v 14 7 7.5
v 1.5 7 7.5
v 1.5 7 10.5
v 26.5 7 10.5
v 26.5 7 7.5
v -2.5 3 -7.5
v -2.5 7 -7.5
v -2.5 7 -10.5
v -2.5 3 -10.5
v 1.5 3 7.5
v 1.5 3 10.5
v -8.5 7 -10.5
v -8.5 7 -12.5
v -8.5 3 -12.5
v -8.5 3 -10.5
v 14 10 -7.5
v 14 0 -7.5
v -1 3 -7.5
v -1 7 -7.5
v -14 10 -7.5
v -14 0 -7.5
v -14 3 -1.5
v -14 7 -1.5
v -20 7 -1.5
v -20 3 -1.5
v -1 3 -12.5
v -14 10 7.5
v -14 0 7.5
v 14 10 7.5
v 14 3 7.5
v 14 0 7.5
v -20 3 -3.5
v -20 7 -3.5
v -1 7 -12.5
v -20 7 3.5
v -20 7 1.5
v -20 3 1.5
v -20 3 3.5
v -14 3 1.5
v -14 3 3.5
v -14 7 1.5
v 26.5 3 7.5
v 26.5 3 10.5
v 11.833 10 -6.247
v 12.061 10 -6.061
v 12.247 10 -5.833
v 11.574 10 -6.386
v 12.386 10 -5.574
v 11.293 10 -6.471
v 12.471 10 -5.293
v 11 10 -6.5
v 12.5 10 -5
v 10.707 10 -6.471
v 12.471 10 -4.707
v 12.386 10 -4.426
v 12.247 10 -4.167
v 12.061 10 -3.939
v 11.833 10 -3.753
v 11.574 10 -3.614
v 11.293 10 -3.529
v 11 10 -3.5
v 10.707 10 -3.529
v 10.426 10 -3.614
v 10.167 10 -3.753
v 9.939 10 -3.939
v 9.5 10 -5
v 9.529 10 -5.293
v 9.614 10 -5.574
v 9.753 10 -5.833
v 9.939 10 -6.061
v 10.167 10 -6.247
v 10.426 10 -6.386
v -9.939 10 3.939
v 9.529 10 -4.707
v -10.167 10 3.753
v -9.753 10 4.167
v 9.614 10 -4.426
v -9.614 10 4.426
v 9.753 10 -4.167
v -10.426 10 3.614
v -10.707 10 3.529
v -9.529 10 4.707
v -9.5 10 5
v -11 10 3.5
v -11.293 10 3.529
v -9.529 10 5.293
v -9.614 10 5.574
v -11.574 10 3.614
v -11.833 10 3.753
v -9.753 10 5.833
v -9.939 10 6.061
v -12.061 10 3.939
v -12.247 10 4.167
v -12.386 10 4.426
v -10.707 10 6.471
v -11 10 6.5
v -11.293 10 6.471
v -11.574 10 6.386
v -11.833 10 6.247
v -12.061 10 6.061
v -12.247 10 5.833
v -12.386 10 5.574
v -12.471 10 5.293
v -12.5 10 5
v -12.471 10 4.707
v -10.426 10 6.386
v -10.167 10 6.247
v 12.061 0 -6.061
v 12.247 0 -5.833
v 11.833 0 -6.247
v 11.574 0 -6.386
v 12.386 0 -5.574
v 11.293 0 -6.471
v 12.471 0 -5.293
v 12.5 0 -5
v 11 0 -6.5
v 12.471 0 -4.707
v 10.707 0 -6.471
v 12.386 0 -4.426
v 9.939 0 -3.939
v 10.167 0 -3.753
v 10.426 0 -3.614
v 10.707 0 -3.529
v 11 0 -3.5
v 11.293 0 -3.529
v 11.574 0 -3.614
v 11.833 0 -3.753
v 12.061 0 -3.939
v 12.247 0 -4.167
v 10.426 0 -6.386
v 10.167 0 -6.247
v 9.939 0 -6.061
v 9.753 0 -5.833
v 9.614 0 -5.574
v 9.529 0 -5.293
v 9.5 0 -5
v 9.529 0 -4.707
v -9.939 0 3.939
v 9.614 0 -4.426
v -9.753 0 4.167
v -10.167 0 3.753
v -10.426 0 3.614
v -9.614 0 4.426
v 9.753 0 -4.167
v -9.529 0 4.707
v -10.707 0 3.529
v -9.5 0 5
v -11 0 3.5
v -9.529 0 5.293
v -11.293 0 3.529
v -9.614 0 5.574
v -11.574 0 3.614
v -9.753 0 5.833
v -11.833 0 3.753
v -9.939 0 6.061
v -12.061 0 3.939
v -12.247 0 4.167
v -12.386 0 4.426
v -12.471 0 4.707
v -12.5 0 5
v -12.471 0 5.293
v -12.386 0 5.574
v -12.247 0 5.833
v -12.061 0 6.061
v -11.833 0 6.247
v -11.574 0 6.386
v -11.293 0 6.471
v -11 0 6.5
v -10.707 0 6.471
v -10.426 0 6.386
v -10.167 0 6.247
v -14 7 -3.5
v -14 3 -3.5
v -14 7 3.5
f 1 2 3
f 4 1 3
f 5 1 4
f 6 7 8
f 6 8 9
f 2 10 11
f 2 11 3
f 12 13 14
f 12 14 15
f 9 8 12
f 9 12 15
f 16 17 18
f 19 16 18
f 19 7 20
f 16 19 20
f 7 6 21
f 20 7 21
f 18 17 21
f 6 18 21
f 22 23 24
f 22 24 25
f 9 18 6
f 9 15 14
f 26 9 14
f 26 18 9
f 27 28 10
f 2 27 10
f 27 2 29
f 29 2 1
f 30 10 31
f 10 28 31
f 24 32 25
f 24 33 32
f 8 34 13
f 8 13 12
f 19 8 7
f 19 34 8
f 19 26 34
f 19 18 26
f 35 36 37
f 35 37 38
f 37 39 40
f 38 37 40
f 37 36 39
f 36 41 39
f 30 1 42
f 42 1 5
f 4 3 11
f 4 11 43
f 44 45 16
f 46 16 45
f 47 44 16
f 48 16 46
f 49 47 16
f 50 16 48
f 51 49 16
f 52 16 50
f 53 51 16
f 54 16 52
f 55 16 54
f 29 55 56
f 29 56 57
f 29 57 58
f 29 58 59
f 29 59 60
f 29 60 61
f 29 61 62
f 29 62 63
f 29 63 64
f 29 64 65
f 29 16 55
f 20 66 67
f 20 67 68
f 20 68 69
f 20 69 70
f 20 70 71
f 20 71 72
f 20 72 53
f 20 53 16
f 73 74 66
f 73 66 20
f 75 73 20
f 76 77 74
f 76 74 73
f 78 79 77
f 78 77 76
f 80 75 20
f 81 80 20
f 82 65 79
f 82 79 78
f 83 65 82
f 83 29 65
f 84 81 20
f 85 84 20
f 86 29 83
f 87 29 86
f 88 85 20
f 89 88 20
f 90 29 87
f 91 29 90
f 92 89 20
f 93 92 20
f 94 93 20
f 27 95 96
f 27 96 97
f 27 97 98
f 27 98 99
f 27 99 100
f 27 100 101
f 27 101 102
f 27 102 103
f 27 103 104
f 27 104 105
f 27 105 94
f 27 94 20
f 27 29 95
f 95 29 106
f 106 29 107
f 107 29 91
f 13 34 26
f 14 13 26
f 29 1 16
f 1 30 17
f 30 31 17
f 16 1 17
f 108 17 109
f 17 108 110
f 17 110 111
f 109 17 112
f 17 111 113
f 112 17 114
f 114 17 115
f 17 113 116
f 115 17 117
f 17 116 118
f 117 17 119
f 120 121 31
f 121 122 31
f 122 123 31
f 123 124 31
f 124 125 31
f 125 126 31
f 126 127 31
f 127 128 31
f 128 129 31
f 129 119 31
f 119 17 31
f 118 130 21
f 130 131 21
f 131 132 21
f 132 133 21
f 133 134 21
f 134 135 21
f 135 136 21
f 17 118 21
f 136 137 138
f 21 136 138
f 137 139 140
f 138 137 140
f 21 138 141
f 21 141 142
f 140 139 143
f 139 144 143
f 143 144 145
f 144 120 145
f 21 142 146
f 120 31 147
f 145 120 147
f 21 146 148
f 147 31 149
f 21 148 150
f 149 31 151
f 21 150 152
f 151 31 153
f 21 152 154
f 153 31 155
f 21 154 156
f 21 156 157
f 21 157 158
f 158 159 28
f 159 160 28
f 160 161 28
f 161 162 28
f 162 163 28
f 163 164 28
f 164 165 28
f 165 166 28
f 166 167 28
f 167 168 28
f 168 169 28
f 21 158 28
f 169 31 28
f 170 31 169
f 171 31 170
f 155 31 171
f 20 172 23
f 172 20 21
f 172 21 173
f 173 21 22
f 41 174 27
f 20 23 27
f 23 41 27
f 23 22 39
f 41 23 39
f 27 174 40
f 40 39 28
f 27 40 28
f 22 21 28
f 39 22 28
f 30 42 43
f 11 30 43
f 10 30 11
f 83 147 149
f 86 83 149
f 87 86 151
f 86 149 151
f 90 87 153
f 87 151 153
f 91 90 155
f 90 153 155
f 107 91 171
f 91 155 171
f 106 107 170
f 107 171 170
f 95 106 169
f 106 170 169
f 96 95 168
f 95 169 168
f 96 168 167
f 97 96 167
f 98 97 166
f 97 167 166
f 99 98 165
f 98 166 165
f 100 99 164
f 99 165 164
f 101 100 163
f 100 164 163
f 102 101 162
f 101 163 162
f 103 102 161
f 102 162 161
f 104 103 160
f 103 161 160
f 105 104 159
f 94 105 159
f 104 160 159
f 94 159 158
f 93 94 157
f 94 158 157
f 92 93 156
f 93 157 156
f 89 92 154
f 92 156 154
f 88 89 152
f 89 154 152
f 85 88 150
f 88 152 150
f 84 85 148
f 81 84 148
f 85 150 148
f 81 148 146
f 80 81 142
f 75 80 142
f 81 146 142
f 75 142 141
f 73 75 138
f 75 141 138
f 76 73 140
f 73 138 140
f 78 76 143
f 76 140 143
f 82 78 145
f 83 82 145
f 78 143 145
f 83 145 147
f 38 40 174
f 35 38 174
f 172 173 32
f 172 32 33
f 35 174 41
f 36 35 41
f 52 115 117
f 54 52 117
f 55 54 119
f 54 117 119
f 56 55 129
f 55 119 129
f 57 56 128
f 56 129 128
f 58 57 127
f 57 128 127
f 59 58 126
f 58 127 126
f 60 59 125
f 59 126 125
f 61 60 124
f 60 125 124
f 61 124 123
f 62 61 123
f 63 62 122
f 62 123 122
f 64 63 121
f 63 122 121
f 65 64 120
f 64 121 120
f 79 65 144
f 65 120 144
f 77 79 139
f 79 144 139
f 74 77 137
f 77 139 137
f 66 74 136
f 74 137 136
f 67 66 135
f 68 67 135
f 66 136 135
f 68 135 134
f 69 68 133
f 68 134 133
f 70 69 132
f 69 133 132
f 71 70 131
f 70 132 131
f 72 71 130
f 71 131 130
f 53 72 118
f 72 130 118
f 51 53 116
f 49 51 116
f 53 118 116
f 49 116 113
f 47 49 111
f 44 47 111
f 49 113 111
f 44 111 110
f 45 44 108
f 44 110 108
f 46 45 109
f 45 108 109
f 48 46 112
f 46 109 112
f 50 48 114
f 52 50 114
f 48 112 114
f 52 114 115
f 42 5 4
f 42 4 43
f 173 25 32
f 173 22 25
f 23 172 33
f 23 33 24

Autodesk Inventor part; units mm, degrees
ref_plane "YZ Plane" through (0, 0, 0) normal (1, 0, 0) x (0, 1, 0)
ref_plane "XZ Plane" through (0, 0, 0) normal (0, 1, 0) x (-1, 0, 0)
ref_plane "XY Plane" through (0, 0, 0) normal (0, 0, 1) x (1, 0, 0)
sketch "Sketch1" plane through (0, 0, 0) normal (0, 1, 0) x (-1, 0, 0)
  line L0 (14, 7.5) -> (-14, 7.5)
  line L1 (-14, 7.5) -> (-14, -7.5)
  line L2 (-14, -7.5) -> (14, -7.5)
  line L3 (14, -7.5) -> (14, 7.5)
  line L4 (14, 7.5) -> (-14, -7.5) construction
  line L5 (-14, 7.5) -> (14, -7.5) construction
  point P0 (0, 0)
  dimension "d0" = 28
  dimension "d1" = 15
extrude "Extrusion1" add sketch "Sketch1" along normal blind 10
sketch "Sketch2" plane through (-14, 0, 7.5) normal (0, 0, 1) x (1, 0, 0)
  line L0 (15.5, 7) -> (40.5, 7)
  line L1 (40.5, 7) -> (40.5, 3)
  line L2 (40.5, 3) -> (15.5, 3)
  line L3 (15.5, 3) -> (15.5, 7)
  line L4 (28, 0) -> (28, 10) projected
  line L5 (15.5, 7) -> (40.5, 3) construction
  line L6 (40.5, 7) -> (15.5, 3) construction
  point P0 (14, 0)
  point P1 (28, 5)
  dimension "d4" = 25
  dimension "d5" = 4
extrude "Extrusion2" add sketch "Sketch2" along normal blind 3
sketch "Sketch3" plane through (14, 0, -7.5) normal (0, 0, -1) x (-1, 0, 0)
  line L0 (0, 3) -> (0, 7) projected
  line L1 (0, 5) -> (15, 5)
  line L2 (16.5, 3) -> (13.5, 3)
  line L3 (13.5, 3) -> (13.5, 7)
  line L4 (13.5, 7) -> (16.5, 7)
  line L5 (16.5, 7) -> (16.5, 3)
  line L6 (16.5, 3) -> (13.5, 7) construction
  line L7 (13.5, 3) -> (16.5, 7) construction
  line L8 (15, 3) -> (15, 7)
  point P0 (14, 0)
  dimension "d8" = 15
  dimension "d9" = 3
extrude "Extrusion3" add sketch "Sketch3" along normal blind 5 contours L8 L4 L5 L2
sketch "Sketch4" plane through (-2.5, 3, -7.5) normal (-1, 0, 0) x (0, 0, 1)
  line L0 (-5, 4) -> (-5, 0) projected
  line L1 (-5, 4) -> (-3, 4)
  line L2 (-3, 4) -> (-3, 0)
  line L3 (-3, 0) -> (-5, 0)
  line L4 (-5, 0) -> (-5, 4)
  point P0 (7.5, -3)
  dimension "d12" = 2
extrude "Extrusion4" add sketch "Sketch4" along normal blind 6
sketch "Sketch5" plane through (-14, 0, -7.5) normal (-1, 0, 0) x (0, 0, 1)
  line L0 (0, 0) -> (0, 10) projected
  line L1 (0, 5) -> (4, 5)
  line L2 (6, 3) -> (2, 3)
  line L3 (2, 3) -> (2, 7)
  line L4 (2, 7) -> (6, 7)
  line L5 (6, 7) -> (6, 3)
  line L6 (6, 3) -> (2, 7) construction
  line L7 (2, 3) -> (6, 7) construction
  line L8 (4, 3) -> (4, 7)
  line L9 (7.5, 0) -> (7.5, 3)
  line L10 (15, 5) -> (11, 5)
  line L11 (9, 3) -> (13, 3)
  line L12 (13, 3) -> (13, 7)
  line L13 (13, 7) -> (9, 7)
  line L14 (9, 7) -> (9, 3)
  line L15 (9, 3) -> (13, 7) construction
  line L16 (13, 3) -> (9, 7) construction
  line L17 (11, 3) -> (11, 7)
  dimension "d15" = 4
  dimension "d16" = 4
  dimension "d17" = 4
  dimension "d18" = 3
extrude "Extrusion5" add sketch "Sketch5" along normal blind 6 contours L8 L4 L5 L2 | L17 L11 L14 L13
sketch "Sketch7" plane through (0, 0, 0) normal (0, -1, 0) x (1, 0, 0)
  line L0 (14, 7.5) -> (14, -7.5) projected
  line L1 (-14, -7.5) -> (-14, 7.5) projected
  line L2 (11, -5) -> (-11, -5)
  line L3 (-11, -5) -> (-11, 5)
  line L4 (-11, 5) -> (11, 5)
  line L5 (11, 5) -> (11, -5)
  line L6 (11, -5) -> (-11, 5) construction
  line L7 (-11, -5) -> (11, 5) construction
  circle A0 centre (-11, 5) radius 1.5
  circle A1 centre (11, -5) radius 1.5
  point P0 (0, 0)
  dimension "d40" = 22
  dimension "d41" = 10
  dimension "d42" = 3
  dimension "d43" = 3
extrude "Extrusion7" cut sketch "Sketch7" against normal blind 15 contours L5 A1 L2 | L2 A1 L5 | A0 L4 L3 | L3 L4 A0
properties part number "FINAL_DE_CARRERA"
